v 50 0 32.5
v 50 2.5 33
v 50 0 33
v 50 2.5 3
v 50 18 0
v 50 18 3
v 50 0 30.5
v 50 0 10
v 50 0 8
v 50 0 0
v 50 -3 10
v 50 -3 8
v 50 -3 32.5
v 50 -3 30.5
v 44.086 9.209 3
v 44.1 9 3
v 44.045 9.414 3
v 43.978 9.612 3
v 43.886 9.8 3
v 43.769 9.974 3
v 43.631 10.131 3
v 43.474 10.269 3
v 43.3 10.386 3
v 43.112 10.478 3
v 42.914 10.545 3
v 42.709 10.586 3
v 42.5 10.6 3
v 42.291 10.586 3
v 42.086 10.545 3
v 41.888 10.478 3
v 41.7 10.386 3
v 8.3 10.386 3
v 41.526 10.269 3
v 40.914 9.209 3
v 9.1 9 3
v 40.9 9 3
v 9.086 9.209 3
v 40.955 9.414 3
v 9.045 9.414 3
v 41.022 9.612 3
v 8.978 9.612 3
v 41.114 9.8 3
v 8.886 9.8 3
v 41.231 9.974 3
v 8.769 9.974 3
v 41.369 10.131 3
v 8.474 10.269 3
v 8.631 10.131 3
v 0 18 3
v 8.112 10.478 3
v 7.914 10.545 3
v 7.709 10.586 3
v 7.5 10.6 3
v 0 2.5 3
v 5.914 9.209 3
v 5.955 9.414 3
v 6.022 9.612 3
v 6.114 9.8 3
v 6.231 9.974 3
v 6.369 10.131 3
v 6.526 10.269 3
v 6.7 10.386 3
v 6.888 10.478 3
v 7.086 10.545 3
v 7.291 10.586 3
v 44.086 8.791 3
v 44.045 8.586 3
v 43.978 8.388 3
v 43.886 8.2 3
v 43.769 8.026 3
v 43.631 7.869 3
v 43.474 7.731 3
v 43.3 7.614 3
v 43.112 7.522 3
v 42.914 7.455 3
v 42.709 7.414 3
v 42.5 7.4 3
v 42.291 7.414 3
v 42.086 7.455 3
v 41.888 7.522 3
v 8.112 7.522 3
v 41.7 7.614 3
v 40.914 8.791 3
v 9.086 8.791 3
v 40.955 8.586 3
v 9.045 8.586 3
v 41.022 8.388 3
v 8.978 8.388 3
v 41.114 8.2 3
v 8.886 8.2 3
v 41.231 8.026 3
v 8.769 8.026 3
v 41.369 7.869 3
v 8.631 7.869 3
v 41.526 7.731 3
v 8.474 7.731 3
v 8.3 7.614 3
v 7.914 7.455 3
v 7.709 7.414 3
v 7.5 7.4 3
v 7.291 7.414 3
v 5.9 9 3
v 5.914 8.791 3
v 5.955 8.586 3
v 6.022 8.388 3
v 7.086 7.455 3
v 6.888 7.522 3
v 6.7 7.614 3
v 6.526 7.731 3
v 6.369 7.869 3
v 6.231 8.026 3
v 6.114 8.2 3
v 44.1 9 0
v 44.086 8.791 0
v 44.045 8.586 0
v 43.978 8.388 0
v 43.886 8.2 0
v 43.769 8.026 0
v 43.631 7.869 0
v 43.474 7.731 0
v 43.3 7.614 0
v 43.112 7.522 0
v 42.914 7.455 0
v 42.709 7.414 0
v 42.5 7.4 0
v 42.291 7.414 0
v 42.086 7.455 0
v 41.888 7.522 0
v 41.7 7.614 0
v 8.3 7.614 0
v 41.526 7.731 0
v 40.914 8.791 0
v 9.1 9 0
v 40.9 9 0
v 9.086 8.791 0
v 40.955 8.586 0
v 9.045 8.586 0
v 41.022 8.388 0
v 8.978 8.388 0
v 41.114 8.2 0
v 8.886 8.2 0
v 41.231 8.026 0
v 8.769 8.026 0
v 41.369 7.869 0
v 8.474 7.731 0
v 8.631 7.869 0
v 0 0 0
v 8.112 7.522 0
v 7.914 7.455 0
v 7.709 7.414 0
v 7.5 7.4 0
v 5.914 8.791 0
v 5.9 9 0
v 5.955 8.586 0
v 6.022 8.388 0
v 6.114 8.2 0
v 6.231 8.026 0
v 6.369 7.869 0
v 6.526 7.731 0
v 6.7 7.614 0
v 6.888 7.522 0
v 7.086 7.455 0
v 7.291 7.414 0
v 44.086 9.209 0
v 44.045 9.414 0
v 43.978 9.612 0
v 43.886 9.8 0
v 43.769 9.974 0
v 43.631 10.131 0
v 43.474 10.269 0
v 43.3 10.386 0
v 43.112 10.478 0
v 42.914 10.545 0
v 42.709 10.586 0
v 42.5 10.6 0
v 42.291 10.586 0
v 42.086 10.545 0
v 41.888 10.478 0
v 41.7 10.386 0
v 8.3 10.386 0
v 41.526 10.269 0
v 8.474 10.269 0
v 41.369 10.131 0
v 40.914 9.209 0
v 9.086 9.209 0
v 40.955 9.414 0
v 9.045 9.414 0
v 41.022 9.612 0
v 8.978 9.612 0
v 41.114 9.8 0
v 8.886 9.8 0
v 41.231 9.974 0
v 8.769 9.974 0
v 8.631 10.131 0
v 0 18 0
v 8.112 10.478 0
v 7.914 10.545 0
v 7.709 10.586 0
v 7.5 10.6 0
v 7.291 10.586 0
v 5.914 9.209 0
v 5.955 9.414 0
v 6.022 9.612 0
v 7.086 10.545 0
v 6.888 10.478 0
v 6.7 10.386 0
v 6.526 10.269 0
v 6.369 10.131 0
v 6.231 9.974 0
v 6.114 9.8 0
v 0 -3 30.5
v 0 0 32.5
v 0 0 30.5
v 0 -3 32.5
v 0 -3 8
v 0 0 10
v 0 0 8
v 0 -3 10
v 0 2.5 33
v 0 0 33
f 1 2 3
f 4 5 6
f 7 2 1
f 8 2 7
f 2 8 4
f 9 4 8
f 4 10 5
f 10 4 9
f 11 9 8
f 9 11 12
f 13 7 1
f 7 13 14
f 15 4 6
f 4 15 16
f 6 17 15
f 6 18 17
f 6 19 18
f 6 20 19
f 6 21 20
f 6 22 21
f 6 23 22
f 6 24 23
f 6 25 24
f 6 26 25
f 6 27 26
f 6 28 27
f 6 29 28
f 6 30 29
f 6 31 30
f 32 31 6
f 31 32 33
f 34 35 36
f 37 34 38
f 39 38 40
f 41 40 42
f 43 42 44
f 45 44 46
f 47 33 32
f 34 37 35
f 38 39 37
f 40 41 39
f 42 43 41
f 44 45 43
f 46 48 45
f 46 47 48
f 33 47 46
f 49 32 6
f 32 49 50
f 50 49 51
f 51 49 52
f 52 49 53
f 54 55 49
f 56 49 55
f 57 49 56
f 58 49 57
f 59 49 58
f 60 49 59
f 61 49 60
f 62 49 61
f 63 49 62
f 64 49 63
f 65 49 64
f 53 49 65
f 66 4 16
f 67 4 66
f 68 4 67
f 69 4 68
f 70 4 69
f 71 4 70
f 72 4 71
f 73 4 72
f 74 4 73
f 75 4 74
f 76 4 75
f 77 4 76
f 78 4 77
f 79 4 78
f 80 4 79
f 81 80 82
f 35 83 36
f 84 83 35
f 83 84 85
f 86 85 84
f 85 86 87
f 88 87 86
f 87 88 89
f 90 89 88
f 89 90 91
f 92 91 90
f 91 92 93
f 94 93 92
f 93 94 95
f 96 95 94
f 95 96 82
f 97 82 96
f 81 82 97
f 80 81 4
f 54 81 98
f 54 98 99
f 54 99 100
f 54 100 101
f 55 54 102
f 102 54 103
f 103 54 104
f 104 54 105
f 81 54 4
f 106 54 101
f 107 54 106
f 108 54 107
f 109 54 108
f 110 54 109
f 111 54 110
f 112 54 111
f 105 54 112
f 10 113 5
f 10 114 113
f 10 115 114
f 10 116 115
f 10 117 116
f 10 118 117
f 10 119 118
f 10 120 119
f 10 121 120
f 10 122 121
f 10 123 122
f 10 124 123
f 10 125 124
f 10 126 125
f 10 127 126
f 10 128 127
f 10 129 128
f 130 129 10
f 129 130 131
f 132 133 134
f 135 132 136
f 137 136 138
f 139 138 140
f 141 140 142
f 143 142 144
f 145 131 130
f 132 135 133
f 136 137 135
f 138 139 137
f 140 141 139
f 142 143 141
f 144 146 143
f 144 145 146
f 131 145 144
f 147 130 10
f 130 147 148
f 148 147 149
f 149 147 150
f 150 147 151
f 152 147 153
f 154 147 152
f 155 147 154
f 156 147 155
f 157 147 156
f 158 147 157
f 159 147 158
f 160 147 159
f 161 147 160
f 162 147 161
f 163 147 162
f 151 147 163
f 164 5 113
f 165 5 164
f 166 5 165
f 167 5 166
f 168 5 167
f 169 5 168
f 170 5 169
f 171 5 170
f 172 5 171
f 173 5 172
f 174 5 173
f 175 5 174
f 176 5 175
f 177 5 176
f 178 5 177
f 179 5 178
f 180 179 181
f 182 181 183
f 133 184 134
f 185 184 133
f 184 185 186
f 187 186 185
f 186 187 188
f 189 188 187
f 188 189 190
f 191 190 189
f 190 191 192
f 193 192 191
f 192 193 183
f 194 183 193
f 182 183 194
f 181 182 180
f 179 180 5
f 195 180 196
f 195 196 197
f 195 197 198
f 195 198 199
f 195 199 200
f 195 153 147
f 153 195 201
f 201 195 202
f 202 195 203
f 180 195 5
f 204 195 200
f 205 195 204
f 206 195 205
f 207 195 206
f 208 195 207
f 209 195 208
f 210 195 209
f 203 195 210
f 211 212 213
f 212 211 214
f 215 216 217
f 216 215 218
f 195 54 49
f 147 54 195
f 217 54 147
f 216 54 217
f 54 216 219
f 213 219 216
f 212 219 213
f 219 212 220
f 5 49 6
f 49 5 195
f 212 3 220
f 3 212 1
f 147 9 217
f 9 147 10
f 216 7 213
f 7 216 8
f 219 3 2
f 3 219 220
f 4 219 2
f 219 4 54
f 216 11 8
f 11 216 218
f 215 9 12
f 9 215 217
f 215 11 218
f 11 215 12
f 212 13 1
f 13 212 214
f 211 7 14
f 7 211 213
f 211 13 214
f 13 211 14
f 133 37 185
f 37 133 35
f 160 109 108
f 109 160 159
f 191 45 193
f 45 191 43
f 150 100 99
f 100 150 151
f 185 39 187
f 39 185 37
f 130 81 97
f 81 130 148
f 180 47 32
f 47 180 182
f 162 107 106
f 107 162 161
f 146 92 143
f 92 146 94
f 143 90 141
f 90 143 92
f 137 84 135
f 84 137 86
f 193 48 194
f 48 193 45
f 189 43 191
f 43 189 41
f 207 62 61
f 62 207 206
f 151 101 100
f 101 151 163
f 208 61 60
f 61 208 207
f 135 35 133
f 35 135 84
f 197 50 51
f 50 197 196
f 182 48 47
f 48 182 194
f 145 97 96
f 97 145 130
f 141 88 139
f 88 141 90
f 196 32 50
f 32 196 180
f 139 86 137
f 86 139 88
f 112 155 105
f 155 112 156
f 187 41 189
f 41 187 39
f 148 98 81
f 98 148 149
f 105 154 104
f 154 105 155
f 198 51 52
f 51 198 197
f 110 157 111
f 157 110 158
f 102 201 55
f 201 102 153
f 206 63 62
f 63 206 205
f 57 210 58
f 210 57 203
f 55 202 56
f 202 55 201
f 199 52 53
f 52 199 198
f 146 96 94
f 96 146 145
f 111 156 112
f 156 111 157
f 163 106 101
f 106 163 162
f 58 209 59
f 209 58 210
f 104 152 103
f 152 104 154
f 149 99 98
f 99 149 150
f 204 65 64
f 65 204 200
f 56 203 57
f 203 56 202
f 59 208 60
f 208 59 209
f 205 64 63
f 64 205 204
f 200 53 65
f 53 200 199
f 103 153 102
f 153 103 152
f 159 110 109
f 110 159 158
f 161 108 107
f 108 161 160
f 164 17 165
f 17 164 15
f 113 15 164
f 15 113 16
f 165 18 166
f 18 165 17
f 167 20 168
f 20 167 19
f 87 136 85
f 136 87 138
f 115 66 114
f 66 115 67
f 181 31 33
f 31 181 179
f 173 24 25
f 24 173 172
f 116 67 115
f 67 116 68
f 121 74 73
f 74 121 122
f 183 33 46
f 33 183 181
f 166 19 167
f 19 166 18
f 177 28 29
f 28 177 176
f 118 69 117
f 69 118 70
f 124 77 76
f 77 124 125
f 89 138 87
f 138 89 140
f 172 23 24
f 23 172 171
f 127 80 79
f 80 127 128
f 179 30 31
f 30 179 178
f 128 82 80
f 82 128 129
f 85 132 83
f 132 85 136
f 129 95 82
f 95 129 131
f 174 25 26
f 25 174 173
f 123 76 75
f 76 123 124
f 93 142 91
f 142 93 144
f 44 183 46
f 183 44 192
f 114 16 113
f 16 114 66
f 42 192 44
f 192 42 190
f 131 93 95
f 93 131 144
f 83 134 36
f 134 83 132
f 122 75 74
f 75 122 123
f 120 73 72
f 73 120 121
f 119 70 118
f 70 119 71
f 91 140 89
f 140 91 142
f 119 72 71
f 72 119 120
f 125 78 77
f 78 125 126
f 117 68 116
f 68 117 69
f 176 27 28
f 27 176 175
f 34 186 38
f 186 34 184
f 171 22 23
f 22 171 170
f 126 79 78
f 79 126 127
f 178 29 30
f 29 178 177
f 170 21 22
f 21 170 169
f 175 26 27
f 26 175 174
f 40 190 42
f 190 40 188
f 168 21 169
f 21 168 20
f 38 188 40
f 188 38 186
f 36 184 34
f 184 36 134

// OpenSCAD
// EvoBot reference-01 — HC-SR04 Sensor Bracket (print 2x)
// L-bracket with channel rails for slide-in PCB retention
// Open in OpenSCAD → Render (F6) → Export STL (F7)

// Parametric dimensions (mm)
bracket_len    = 50;       // X dimension
base_w         = 18;       // Y dimension (base depth)
base_t         = 3;       // Z (base thickness)
wall_t         = 2.5;       // Y (back wall thickness)
wall_h         = 30;       // Z (wall height above base top)
rail_d         = 3;   // Y (rail protrusion)
rail_h         = 2;       // Z (rail thickness)
bot_rail_z     = 8;   // Z offset for bottom rail
board_gap      = 20.5;    // gap between rails (HC-SR04 height)
hole_span      = 35;    // M3 bolt hole spacing
mount_hole_dia = 3.2;         // M3 clearance

$fn = 48;

module sensor_bracket() {
    top_rail_z = bot_rail_z + rail_h + board_gap;

    difference() {
        union() {
            // Base plate
            cube([bracket_len, base_w, base_t]);
            // Back wall
            cube([bracket_len, wall_t, base_t + wall_h]);
            // Bottom rail
            translate([0, -rail_d, bot_rail_z])
                cube([bracket_len, rail_d, rail_h]);
            // Top rail
            translate([0, -rail_d, top_rail_z])
                cube([bracket_len, rail_d, rail_h]);
        }
        // M3 bolt holes through base
        for (sx = [-1, 1])
            translate([bracket_len/2 + sx*hole_span/2, base_w/2, -1])
                cylinder(d=mount_hole_dia, h=base_t + 2);
    }
}

sensor_bracket();
